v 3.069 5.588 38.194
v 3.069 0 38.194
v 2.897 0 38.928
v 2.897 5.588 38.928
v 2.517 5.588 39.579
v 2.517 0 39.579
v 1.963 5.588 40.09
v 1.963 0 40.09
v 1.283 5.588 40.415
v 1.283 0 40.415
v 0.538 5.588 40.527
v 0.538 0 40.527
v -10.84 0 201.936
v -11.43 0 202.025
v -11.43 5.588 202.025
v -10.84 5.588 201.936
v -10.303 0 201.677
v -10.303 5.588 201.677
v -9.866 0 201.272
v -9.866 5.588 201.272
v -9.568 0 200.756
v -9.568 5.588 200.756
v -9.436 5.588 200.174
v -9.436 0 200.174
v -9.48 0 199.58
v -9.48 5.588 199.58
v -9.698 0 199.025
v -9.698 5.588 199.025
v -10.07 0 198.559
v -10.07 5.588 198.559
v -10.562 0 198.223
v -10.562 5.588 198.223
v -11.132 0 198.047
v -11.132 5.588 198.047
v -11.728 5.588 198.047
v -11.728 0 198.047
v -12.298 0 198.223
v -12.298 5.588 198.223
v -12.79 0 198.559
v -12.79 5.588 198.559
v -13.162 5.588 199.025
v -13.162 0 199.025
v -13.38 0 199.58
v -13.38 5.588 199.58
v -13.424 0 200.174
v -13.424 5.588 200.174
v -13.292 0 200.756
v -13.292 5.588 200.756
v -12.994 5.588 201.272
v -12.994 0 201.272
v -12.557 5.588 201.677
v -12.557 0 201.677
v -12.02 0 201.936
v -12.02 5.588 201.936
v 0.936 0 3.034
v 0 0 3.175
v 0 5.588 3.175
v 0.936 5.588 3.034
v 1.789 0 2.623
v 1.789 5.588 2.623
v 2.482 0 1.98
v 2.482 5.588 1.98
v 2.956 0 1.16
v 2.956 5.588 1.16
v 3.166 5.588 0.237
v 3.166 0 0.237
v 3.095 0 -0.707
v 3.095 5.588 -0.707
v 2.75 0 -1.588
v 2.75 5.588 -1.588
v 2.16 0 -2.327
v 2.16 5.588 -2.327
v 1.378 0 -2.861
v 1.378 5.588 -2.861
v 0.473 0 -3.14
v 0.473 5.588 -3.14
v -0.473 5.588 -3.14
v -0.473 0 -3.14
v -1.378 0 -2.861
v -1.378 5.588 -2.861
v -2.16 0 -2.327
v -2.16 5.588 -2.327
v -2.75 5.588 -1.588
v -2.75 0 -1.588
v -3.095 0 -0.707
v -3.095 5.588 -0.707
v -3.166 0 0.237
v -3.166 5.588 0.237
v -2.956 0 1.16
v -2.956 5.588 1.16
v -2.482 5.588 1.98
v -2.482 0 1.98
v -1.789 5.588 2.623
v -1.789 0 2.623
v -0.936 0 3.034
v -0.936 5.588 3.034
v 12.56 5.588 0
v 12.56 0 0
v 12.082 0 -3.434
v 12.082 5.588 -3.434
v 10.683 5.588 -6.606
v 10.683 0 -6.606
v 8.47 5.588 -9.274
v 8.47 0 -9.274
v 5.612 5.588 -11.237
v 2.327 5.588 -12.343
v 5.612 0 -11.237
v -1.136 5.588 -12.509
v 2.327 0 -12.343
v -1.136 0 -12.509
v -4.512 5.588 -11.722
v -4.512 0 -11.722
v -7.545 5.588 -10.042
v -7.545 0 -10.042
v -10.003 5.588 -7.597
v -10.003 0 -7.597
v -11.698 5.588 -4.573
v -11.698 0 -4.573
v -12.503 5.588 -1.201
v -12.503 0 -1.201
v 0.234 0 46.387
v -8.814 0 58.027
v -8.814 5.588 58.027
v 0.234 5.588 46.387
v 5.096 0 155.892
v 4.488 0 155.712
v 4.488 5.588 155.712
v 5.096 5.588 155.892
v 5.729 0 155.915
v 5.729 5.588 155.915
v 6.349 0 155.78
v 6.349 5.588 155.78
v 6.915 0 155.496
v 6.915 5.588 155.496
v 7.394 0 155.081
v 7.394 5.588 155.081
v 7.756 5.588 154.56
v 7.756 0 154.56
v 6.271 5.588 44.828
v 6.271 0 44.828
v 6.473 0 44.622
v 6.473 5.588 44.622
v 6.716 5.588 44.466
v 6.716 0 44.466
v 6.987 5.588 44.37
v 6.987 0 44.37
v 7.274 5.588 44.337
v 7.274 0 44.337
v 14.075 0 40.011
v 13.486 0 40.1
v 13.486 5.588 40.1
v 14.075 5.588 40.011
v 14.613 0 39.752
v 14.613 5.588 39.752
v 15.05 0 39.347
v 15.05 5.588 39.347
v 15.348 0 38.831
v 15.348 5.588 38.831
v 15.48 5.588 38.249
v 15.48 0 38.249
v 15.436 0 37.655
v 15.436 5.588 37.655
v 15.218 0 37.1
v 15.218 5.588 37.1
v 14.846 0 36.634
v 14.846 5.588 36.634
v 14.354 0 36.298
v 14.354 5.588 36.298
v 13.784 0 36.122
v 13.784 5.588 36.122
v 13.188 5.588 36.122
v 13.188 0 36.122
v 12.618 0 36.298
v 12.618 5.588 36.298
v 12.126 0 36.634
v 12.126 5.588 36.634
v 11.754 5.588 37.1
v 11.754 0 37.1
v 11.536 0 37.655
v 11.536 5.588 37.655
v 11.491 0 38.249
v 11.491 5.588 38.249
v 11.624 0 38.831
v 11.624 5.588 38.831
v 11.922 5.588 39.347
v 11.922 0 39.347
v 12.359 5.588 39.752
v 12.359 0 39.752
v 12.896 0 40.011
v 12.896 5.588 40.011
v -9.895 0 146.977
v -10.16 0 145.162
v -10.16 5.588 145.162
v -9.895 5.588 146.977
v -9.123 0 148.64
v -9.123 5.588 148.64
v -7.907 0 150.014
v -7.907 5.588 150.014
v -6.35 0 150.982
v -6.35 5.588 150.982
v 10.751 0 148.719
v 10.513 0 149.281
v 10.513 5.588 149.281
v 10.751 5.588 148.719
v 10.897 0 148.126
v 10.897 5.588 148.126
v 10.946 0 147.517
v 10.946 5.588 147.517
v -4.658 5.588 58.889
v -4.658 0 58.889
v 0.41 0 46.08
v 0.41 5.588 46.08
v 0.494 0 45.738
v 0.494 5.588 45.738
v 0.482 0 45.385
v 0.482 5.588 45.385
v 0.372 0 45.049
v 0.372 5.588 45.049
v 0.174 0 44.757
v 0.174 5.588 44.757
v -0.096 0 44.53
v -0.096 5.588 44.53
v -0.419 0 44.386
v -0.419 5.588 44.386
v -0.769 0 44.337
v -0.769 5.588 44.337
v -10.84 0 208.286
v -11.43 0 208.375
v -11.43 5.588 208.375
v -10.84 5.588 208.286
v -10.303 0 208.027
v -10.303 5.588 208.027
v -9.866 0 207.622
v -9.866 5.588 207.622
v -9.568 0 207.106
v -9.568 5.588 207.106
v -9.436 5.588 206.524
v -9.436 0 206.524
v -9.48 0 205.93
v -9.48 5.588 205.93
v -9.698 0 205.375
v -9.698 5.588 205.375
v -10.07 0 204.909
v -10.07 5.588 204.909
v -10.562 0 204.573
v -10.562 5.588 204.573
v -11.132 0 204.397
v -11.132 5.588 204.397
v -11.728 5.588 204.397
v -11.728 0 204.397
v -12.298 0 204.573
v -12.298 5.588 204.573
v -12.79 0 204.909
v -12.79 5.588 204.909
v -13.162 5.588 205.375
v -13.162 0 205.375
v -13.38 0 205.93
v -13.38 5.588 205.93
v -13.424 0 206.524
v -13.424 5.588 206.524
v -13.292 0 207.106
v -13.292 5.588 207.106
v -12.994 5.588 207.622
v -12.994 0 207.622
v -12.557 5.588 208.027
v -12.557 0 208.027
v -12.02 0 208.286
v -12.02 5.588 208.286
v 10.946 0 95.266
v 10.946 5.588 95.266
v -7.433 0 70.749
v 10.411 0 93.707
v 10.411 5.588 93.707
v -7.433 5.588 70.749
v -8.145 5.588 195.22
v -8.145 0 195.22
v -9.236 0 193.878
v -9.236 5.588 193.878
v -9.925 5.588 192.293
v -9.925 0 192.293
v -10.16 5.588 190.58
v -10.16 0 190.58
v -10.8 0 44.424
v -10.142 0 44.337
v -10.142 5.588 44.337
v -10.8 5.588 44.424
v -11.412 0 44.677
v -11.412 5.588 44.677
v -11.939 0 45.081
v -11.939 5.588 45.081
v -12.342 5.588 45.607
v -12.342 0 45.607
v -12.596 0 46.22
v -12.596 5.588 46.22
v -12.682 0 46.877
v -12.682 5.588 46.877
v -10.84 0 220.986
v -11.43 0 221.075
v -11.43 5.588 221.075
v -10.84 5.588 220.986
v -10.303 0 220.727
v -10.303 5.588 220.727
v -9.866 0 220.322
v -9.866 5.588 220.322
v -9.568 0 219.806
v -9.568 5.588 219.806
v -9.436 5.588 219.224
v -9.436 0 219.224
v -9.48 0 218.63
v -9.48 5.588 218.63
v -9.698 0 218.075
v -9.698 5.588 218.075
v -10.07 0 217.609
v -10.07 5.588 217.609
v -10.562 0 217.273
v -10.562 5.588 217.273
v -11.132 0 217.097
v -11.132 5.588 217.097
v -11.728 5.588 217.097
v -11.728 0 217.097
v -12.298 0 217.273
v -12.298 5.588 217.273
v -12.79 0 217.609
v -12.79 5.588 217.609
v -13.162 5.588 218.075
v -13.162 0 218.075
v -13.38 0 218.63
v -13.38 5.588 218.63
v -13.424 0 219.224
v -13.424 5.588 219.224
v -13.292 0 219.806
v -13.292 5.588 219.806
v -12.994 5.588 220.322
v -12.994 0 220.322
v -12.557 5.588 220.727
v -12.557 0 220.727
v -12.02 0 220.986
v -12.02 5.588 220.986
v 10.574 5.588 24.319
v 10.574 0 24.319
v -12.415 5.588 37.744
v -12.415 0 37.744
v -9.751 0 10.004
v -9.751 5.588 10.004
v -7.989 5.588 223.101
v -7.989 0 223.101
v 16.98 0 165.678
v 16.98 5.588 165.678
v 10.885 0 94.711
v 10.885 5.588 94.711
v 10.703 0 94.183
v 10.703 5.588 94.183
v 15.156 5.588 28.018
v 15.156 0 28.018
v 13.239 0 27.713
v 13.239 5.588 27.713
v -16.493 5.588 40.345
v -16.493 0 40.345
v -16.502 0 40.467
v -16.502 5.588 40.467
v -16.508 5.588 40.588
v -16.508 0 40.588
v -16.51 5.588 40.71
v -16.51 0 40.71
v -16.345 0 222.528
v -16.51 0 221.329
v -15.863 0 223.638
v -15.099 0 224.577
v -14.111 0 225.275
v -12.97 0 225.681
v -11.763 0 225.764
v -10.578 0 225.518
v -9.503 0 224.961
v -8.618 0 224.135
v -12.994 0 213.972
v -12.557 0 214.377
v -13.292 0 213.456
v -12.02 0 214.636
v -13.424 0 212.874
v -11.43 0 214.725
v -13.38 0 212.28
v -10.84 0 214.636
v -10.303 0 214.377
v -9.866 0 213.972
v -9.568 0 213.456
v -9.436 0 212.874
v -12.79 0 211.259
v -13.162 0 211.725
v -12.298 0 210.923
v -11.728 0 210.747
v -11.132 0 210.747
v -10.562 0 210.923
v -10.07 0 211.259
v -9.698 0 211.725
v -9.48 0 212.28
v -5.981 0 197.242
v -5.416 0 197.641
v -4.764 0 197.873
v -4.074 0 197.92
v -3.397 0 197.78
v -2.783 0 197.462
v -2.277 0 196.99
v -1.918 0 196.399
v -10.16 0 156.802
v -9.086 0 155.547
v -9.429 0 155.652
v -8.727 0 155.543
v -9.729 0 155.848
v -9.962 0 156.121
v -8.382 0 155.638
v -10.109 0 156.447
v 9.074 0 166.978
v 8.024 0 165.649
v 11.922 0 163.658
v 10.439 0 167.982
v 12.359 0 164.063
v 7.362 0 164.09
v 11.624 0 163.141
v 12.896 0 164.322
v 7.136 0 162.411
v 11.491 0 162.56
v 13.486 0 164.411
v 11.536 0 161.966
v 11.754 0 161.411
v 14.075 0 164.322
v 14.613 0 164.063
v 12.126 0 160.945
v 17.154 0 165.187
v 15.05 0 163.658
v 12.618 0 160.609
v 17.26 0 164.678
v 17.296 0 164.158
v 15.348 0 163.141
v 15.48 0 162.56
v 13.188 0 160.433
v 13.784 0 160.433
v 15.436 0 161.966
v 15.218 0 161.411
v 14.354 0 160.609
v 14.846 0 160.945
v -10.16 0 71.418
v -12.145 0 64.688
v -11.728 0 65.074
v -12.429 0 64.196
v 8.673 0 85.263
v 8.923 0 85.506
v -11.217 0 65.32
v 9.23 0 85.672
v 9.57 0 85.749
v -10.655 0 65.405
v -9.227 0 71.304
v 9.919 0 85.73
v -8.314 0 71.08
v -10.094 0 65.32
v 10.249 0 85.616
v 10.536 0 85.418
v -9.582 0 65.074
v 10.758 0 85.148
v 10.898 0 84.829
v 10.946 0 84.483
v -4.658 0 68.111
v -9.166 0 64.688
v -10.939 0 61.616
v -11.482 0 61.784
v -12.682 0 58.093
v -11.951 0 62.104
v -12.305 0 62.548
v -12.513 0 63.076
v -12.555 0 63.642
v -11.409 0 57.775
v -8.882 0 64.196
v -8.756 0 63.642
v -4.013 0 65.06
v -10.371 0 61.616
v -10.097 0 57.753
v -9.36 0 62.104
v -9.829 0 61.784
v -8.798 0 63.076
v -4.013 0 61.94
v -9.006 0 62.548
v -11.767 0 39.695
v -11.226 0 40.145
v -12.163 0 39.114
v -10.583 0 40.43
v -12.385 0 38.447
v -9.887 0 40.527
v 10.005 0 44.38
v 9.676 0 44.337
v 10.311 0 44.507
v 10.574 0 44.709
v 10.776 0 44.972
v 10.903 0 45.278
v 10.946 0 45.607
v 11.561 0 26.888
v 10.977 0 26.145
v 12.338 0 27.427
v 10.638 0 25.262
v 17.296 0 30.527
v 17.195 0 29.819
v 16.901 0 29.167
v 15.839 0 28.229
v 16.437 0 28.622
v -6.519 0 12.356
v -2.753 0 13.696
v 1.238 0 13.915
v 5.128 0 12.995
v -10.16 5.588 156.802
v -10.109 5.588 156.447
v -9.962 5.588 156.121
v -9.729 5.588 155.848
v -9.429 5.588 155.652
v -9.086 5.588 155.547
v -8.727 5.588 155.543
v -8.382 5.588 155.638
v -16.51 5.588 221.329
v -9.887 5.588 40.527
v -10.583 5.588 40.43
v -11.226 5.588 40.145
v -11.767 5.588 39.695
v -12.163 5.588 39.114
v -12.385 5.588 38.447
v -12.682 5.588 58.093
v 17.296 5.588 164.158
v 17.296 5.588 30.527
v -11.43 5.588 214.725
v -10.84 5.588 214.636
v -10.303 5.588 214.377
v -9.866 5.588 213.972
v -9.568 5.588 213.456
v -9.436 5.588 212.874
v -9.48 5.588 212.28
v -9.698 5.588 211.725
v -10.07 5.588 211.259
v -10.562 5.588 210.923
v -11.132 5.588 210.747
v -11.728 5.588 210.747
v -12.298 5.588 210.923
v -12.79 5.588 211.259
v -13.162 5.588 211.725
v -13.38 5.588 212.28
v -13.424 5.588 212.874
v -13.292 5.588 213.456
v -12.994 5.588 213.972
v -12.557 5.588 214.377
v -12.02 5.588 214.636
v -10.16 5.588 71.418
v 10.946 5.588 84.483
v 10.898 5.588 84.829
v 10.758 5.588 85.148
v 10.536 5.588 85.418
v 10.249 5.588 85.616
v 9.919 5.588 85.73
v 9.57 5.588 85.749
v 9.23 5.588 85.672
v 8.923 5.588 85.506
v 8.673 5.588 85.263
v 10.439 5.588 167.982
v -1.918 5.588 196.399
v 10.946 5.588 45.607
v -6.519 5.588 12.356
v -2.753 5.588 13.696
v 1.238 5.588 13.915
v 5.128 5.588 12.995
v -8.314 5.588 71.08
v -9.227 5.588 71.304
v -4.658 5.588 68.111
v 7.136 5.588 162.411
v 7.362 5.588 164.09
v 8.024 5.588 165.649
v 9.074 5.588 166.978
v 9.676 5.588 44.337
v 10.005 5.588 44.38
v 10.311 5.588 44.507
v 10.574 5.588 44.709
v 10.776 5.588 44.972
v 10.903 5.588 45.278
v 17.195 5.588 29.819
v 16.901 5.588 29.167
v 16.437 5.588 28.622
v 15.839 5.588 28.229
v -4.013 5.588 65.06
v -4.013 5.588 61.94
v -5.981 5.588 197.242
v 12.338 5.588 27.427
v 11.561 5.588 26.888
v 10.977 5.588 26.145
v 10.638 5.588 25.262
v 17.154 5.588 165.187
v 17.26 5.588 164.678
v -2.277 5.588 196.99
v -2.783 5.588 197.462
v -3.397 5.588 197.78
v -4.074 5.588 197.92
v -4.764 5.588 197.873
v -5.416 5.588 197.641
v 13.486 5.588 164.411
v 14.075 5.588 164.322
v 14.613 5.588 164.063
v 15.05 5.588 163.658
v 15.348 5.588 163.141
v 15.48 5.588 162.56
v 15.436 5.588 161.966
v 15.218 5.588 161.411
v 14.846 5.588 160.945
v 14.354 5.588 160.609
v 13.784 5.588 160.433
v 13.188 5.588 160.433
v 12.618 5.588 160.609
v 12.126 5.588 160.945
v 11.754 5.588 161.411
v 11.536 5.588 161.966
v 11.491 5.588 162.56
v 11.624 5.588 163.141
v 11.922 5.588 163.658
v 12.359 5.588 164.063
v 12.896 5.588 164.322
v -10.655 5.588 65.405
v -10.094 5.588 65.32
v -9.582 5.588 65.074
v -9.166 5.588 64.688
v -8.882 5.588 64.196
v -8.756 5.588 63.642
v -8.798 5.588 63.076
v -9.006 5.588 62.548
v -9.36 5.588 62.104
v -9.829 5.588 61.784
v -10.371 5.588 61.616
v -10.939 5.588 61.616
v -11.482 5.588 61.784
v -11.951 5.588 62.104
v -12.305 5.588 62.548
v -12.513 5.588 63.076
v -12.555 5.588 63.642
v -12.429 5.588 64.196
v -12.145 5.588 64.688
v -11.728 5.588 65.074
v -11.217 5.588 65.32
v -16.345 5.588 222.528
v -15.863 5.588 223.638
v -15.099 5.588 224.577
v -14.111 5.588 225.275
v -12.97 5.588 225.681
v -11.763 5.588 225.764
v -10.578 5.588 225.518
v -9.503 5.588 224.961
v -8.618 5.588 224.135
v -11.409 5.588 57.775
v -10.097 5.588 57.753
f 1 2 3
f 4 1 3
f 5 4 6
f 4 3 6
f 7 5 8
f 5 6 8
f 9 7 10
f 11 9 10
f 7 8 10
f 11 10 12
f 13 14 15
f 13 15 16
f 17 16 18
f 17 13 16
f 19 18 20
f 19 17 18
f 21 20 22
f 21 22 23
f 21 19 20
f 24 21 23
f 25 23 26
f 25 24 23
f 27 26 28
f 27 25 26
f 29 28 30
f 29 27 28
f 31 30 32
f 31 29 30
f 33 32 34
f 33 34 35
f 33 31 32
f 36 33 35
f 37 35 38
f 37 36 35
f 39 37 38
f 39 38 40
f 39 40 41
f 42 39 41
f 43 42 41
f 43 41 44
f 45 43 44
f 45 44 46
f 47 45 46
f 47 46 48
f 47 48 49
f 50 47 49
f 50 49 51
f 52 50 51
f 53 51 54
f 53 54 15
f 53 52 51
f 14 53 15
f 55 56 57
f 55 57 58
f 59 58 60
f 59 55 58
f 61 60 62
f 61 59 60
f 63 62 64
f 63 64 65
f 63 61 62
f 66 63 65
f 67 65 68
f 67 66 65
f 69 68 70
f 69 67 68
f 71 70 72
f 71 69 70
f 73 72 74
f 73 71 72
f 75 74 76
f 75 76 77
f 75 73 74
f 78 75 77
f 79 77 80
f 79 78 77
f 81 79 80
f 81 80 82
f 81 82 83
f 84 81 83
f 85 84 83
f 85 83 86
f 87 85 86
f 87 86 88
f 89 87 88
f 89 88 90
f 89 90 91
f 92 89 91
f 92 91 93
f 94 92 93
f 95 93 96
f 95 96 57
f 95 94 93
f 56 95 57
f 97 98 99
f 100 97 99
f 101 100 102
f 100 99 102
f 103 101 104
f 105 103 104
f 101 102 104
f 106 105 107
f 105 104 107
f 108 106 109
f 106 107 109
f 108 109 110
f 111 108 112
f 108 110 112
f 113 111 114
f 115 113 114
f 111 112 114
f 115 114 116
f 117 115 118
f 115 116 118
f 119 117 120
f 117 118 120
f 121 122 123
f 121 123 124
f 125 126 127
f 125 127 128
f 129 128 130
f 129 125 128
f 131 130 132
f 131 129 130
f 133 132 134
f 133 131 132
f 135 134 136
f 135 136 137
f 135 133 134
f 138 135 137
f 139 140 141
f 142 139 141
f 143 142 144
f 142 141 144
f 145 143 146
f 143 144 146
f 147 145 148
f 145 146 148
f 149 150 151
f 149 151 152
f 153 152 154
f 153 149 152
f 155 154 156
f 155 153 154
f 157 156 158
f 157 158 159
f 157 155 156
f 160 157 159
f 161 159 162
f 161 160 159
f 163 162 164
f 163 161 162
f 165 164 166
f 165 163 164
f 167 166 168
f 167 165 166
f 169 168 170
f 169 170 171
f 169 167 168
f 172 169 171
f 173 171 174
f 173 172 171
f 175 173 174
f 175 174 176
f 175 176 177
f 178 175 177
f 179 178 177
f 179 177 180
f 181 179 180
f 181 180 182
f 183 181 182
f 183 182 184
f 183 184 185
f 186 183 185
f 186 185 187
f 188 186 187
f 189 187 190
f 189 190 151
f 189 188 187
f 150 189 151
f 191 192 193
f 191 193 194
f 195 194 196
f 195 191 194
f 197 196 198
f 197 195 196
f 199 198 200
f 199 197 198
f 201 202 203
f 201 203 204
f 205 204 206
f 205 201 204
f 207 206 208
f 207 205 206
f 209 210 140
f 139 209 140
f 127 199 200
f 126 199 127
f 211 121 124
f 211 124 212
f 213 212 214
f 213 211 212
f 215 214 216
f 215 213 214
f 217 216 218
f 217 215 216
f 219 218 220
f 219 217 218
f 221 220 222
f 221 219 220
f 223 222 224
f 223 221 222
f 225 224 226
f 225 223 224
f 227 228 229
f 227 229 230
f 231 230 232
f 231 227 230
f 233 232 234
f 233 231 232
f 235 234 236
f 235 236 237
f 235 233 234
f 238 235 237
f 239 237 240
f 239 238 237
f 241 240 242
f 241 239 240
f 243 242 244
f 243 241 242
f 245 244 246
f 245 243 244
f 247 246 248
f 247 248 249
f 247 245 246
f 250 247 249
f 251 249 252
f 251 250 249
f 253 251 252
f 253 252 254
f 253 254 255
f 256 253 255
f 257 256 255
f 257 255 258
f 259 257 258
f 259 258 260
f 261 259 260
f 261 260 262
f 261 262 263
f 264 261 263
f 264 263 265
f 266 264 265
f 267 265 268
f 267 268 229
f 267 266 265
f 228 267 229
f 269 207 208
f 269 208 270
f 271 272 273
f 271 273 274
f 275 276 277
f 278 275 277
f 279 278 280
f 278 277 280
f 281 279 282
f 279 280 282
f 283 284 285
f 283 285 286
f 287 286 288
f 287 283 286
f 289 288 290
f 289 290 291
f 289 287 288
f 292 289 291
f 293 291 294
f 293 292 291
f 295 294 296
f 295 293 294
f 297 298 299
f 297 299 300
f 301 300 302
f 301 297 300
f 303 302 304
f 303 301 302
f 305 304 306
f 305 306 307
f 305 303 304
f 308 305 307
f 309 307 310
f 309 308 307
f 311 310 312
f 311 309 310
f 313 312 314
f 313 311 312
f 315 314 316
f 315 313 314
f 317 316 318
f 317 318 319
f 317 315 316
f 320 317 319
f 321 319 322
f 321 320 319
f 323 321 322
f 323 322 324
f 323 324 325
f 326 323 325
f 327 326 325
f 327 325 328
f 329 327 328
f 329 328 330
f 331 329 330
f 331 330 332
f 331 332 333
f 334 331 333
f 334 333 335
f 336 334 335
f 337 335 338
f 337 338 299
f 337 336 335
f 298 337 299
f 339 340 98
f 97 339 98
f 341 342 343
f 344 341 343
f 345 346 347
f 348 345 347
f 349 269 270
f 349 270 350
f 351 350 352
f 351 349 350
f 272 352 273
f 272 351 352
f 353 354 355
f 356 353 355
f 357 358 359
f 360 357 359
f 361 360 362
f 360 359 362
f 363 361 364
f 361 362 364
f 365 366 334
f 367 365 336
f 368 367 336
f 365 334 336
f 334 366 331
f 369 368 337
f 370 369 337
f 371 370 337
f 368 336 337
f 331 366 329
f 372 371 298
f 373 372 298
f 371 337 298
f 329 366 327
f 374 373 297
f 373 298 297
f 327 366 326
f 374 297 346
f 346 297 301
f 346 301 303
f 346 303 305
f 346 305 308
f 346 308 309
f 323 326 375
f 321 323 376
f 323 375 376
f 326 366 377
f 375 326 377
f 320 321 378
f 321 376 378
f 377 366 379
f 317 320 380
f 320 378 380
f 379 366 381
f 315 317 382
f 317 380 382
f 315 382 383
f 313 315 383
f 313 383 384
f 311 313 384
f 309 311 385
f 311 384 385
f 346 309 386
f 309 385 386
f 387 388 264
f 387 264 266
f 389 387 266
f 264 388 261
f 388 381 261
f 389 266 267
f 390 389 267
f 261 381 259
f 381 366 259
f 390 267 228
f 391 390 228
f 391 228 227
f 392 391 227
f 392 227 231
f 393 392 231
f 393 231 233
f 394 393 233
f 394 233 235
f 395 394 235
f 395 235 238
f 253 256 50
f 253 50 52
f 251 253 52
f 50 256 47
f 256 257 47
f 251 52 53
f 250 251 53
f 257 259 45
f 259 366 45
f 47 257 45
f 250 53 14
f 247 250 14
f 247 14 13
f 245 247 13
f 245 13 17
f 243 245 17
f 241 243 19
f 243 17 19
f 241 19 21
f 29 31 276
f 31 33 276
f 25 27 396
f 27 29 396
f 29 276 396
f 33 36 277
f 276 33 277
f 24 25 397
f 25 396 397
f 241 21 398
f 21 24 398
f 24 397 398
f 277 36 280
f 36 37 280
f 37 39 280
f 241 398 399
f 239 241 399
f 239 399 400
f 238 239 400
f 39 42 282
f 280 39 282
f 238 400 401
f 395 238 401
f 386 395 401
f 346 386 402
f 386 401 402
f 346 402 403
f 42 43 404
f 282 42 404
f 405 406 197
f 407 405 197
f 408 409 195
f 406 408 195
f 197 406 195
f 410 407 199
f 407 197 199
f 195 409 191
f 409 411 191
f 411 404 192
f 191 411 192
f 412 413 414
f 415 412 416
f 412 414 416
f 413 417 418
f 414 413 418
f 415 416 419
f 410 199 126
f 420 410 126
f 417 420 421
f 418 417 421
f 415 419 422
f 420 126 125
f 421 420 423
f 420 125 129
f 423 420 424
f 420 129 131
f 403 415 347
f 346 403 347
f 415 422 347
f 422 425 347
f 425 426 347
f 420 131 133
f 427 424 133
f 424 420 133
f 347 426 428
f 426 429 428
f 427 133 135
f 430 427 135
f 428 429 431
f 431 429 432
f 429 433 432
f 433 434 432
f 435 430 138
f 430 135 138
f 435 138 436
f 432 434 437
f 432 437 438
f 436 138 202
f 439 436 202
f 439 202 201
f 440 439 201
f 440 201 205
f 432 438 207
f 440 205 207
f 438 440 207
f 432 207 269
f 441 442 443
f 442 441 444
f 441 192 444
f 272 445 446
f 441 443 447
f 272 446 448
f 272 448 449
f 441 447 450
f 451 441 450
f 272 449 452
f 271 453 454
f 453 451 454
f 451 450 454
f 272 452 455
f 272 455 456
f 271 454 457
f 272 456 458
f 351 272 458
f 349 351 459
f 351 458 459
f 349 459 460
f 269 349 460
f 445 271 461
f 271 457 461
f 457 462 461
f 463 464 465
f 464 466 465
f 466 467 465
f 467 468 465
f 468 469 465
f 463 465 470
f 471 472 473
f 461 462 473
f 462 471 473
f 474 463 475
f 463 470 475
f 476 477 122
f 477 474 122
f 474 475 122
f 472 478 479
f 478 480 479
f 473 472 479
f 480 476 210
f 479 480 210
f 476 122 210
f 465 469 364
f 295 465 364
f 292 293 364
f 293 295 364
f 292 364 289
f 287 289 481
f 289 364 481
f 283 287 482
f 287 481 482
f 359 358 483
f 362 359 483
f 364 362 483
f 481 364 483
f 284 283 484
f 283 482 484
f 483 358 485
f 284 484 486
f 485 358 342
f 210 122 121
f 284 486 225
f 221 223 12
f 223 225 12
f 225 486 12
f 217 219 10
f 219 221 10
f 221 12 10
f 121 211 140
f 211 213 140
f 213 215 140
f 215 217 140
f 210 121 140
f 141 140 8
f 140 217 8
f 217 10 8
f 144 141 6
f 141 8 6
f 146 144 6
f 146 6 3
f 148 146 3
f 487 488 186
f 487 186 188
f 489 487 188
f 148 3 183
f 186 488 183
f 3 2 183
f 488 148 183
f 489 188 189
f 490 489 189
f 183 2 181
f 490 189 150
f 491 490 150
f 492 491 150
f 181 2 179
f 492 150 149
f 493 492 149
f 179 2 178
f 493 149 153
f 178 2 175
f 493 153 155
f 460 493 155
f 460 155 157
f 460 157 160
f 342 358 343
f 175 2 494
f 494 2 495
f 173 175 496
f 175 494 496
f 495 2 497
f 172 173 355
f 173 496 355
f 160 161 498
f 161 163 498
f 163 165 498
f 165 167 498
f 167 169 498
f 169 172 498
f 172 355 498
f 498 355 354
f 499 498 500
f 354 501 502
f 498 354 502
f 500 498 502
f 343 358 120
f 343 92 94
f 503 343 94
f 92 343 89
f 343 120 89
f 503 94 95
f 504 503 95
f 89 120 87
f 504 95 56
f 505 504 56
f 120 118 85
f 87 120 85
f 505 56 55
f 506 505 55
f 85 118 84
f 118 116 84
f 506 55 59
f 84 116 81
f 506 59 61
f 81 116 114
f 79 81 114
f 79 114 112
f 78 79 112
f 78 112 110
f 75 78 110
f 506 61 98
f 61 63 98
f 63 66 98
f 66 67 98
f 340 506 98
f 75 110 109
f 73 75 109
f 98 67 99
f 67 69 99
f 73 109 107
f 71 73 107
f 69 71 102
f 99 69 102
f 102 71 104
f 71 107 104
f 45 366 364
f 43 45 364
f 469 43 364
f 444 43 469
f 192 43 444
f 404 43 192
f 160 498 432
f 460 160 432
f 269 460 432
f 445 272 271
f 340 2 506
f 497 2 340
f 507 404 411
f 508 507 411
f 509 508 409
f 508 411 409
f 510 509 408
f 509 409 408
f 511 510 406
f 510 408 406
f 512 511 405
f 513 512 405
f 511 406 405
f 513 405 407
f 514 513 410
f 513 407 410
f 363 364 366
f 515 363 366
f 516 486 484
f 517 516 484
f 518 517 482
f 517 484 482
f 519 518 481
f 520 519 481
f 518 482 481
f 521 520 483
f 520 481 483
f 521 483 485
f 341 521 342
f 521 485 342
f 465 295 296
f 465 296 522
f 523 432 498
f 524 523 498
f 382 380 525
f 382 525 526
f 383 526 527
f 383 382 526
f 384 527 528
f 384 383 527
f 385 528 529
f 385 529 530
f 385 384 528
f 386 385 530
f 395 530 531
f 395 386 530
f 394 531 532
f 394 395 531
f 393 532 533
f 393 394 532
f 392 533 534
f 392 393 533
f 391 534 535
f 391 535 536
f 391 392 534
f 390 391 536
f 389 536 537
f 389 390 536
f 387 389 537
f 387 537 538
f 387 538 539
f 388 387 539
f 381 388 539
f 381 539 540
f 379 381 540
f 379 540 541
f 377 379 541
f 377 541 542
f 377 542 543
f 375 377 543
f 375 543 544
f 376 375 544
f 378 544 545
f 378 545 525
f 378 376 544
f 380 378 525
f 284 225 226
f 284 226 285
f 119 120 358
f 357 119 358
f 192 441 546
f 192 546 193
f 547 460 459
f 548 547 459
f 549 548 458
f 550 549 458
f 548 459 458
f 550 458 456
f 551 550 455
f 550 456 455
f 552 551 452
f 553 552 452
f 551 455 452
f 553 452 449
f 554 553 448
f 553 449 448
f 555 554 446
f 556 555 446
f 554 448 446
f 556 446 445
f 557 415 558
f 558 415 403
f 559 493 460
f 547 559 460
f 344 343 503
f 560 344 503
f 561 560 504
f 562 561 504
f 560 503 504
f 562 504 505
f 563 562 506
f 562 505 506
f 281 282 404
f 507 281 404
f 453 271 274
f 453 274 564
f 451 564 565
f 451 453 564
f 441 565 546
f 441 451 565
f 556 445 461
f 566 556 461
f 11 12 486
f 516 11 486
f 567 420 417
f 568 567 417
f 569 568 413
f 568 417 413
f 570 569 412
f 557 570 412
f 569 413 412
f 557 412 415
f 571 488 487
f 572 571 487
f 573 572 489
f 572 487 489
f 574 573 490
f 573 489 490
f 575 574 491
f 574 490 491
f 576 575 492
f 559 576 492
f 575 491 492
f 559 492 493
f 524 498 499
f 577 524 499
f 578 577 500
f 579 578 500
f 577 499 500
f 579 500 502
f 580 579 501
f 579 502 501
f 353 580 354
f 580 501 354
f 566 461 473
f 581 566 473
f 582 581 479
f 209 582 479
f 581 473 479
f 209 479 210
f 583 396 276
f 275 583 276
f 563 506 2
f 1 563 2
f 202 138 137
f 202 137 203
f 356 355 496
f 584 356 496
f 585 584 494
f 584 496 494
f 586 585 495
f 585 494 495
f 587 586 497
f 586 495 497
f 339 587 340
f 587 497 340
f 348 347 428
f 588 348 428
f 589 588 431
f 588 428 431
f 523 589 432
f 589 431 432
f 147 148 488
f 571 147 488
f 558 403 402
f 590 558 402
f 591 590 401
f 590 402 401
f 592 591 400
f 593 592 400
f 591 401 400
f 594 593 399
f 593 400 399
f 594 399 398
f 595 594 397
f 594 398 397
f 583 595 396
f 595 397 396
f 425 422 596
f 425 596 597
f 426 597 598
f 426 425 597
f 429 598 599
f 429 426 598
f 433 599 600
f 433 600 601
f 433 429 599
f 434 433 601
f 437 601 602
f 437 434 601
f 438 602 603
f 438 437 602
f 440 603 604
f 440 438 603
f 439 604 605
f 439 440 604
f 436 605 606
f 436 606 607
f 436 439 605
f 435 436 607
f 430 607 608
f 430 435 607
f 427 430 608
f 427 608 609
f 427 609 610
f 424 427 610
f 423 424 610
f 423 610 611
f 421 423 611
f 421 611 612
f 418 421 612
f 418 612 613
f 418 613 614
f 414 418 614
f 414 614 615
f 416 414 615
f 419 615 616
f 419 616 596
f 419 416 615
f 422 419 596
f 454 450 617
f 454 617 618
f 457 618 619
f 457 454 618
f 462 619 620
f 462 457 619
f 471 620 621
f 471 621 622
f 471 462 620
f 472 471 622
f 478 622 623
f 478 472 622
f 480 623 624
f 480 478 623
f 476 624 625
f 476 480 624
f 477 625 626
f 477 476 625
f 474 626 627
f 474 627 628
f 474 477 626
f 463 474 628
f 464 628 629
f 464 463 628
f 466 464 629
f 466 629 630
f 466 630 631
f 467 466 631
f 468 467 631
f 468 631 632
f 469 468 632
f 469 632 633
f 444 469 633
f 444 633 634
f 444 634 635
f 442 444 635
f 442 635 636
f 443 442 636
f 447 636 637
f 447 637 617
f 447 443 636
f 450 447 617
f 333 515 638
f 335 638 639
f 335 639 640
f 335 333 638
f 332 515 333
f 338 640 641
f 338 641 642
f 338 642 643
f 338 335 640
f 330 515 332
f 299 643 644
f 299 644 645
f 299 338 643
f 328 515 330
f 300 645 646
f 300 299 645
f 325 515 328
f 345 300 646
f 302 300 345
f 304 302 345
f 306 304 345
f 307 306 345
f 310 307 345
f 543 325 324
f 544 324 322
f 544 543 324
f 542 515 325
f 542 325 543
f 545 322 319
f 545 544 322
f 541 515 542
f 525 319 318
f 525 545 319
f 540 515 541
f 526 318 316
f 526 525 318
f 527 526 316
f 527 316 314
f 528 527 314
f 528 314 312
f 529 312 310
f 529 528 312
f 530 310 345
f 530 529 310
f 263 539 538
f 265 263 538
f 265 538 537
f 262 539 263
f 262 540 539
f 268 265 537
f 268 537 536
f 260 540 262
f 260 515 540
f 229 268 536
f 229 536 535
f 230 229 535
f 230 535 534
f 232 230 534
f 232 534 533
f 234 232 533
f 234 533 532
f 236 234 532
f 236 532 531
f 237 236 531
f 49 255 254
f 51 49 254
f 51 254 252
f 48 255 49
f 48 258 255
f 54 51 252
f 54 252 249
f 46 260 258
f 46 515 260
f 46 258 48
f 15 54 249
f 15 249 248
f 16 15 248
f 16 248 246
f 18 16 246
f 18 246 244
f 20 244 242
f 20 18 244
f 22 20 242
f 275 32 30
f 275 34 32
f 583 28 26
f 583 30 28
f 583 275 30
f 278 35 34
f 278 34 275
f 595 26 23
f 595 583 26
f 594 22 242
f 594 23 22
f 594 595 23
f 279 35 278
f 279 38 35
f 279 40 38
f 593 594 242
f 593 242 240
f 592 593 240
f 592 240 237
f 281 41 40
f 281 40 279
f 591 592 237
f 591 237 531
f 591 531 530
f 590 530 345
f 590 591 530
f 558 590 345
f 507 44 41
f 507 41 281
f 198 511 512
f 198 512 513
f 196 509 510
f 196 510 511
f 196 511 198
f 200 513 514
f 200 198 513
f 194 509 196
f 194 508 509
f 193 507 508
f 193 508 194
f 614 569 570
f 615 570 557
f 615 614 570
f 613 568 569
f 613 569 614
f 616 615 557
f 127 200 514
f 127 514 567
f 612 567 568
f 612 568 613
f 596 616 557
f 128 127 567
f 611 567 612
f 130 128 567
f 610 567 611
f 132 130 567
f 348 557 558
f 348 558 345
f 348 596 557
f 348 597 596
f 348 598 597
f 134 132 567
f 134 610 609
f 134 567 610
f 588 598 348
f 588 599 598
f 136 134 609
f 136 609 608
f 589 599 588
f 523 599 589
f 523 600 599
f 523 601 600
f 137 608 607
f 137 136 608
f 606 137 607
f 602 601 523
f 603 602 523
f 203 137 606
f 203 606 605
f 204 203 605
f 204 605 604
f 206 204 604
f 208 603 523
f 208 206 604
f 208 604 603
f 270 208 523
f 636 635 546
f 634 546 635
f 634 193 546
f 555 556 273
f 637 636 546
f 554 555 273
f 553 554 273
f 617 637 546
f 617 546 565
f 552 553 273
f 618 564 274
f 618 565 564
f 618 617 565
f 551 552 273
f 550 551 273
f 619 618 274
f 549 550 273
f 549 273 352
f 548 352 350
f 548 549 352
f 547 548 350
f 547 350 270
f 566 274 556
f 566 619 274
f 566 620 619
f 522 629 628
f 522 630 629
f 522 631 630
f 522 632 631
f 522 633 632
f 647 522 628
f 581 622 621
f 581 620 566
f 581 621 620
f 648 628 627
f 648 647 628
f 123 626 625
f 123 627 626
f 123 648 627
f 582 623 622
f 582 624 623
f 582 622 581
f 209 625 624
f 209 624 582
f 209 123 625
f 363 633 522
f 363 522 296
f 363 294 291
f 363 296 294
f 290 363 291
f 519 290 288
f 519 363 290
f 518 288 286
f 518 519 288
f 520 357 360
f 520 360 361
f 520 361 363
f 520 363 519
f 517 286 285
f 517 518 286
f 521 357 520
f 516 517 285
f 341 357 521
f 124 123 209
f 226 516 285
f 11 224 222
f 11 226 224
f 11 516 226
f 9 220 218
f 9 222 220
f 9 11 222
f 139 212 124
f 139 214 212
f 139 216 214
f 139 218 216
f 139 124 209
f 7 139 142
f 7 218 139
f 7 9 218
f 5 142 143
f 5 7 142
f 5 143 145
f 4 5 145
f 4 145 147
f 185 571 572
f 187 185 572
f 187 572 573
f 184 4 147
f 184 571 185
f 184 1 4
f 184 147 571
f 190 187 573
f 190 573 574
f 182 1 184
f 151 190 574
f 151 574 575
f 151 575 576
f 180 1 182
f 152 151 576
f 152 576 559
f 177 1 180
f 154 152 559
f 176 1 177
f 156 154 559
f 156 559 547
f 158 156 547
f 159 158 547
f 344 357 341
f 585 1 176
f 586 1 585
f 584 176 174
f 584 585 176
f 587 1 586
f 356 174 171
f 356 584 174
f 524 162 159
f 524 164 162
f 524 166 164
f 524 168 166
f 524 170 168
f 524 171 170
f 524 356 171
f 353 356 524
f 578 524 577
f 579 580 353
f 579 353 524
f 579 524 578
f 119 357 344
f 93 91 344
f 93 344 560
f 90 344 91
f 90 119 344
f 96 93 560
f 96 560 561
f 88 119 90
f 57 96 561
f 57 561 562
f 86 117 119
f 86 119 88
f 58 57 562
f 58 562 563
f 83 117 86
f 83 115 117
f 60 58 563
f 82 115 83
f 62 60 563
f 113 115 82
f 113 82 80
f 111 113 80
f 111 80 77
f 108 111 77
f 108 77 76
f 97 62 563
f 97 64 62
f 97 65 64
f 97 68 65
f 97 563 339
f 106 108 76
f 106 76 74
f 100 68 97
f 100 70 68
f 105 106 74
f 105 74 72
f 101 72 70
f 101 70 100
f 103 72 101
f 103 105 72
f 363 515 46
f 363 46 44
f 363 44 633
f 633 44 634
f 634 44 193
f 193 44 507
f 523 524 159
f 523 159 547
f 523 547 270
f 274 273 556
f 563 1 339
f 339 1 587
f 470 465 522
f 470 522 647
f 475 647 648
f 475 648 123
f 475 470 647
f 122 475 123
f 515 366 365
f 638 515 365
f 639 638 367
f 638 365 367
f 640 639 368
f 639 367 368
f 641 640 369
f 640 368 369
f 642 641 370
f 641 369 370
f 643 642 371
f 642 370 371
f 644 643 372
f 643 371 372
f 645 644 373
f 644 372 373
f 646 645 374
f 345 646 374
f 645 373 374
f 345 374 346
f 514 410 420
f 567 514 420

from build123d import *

# Parameters (mm, degrees)
SKETCH2_R           = 3.175
SKETCH2_R_2         = 2
SKETCH2_R_3         = 1.905
SKETCH2_R_4         = 1.999999991
BOSS_EXTRUDE1_DEPTH = 5.588


with BuildPart() as part:
    # Sketch2 → Boss-Extrude1 (new body)
    with BuildSketch(Plane(origin=(0, 0, 0), x_dir=(1, 0, 0), z_dir=(0, 1, 0))):
        with BuildLine():
            Line((15.15555913, -28.018449791), (13.238676936, -27.713033224))
            ThreePointArc((13.238676936, -27.713033224), (11.241051513, -26.538356195), (10.573787778, -24.319092227))
            Line((10.573787778, -24.319092227), (12.5603, 0))
            ThreePointArc((12.5603, 0), (0.601023521, 12.545911956), (-12.502780789, 1.200670076))
            Line((-12.502780789, 1.200670076), (-16.492552312, -40.345496304))
            ThreePointArc((-16.492552312, -40.345496304), (-16.505635578, -40.527391114), (-16.51, -40.709703607))
            Line((-16.51, -40.709703607), (-16.51, -221.328861788))
            ThreePointArc((-16.51, -221.328861788), (-12.970187584, -225.680718913), (-7.988667969, -223.101301399))
            Line((-7.988667969, -223.101301399), (16.979901226, -165.677523619))
            ThreePointArc((16.979901226, -165.677523619), (17.216065593, -164.934164738), (17.295902343, -164.158289667))
            Line((17.295902343, -164.158289667), (17.295902343, -30.526810701))
            ThreePointArc((17.295902343, -30.526810701), (16.688093876, -28.878103365), (15.15555913, -28.018449791))
        make_face()
        with Locations(Location((0, 0, 0), (0, 0, 270))):
            Circle(SKETCH2_R, mode=Mode.SUBTRACT)
        with Locations(Location((-11.43, -219.075, 0), (0, 0, 270))):
            Circle(SKETCH2_R_2, mode=Mode.SUBTRACT)
        with Locations(Location((-11.43, -212.725, 0), (0, 0, 270))):
            Circle(SKETCH2_R_2, mode=Mode.SUBTRACT)
        with Locations(Location((-11.43, -206.375, 0), (0, 0, 270))):
            Circle(SKETCH2_R_2, mode=Mode.SUBTRACT)
        with Locations(Location((-11.43, -200.025, 0), (0, 0, 270))):
            Circle(SKETCH2_R_2, mode=Mode.SUBTRACT)
        with Locations(Location((-10.6553, -63.5, 0), (0, 0, 270))):
            Circle(SKETCH2_R_3, mode=Mode.SUBTRACT)
        with Locations(Location((13.485902343, -38.1, 0), (0, 0, 270))):
            Circle(SKETCH2_R_4, mode=Mode.SUBTRACT)
        with Locations(Location((13.485902343, -162.410770806, 0), (0, 0, 270))):
            Circle(SKETCH2_R_2, mode=Mode.SUBTRACT)
        with BuildLine():
            Line((10.438542905, -167.981776143), (-1.917547411, -196.39883837))
            ThreePointArc((-1.917547411, -196.39883837), (-3.730878547, -197.873050616), (-5.981020282, -197.241913761))
            Line((-5.981020282, -197.241913761), (-8.145350704, -195.219576049))
            ThreePointArc((-8.145350704, -195.219576049), (-9.634602002, -193.108963545), (-10.16, -190.579830983))
            Line((-10.16, -190.579830983), (-10.16, -156.802168612))
            ThreePointArc((-10.16, -156.802168612), (-9.585607464, -155.739610257), (-8.381999597, -155.638194561))
            Line((-8.381999597, -155.638194561), (7.135902343, -162.410768606))
            ThreePointArc((7.135902343, -162.410768606), (8.0236114, -165.648961297), (10.438542905, -167.981776143))
        make_face(mode=Mode.SUBTRACT)
        with BuildLine():
            Line((10.945902343, -147.517141807), (10.945902343, -95.265809134))
            ThreePointArc((10.945902343, -95.265809134), (10.80854708, -94.441856302), (10.411336777, -93.70701706))
            Line((10.411336777, -93.70701706), (-7.433233368, -70.749423162))
            ThreePointArc((-7.433233368, -70.749423162), (-8.766818111, -71.205159681), (-10.16, -71.417734996))
            Line((-10.16, -71.417734996), (-10.16, -145.162426346))
            ThreePointArc((-10.16, -145.162426346), (-9.122791771, -148.640463666), (-6.350002016, -150.982296599))
            Line((-6.350002016, -150.982296599), (4.488151635, -155.712459117))
            ThreePointArc((4.488151635, -155.712459117), (6.348753278, -155.779975361), (7.755557144, -154.560426346))
            Line((7.755557144, -154.560426346), (10.513009397, -149.281014802))
            ThreePointArc((10.513009397, -149.281014802), (10.836096789, -148.425250314), (10.945902343, -147.517141807))
        make_face(mode=Mode.SUBTRACT)
        with BuildLine():
            Line((-4.65837794, -58.888907788), (6.271106887, -44.827785995))
            ThreePointArc((6.271106887, -44.827785995), (6.715672228, -44.466407521), (7.273824104, -44.337182032))
            Line((7.273824104, -44.337182032), (9.675902343, -44.337182032))
            ThreePointArc((9.675902343, -44.337182032), (10.573927955, -44.70915642), (10.945902343, -45.607182032))
            Line((10.945902343, -45.607182032), (10.945902343, -84.483166252))
            ThreePointArc((10.945902343, -84.483166252), (10.087878759, -85.684488621), (8.673185126, -85.26256229))
            Line((8.673185126, -85.26256229), (-4.65837794, -68.111092212))
            ThreePointArc((-4.65837794, -68.111092212), (-3.931340897, -63.5), (-4.65837794, -58.888907788))
        make_face(mode=Mode.SUBTRACT)
        with BuildLine():
            Line((-12.415233052, -37.744377163), (-9.751235062, -10.003715048))
            ThreePointArc((-9.751235062, -10.003715048), (-2.753398549, -13.695973731), (5.127655889, -12.99492382))
            Line((5.127655889, -12.99492382), (3.069264048, -38.19397392))
            ThreePointArc((3.069264048, -38.19397392), (2.259083254, -39.854914801), (0.537695935, -40.527182032))
            Line((0.537695935, -40.527182032), (-9.886864844, -40.527182032))
            ThreePointArc((-9.886864844, -40.527182032), (-11.766801594, -39.695232914), (-12.415233052, -37.744377163))
        make_face(mode=Mode.SUBTRACT)
        with BuildLine():
            Line((-0.768822282, -44.337182032), (-10.142472044, -44.337182032))
            ThreePointArc((-10.142472044, -44.337182032), (-11.938523268, -45.081130808), (-12.682472044, -46.877182032))
            Line((-12.682472044, -46.877182032), (-12.682472044, -58.093297101))
            ThreePointArc((-12.682472044, -58.093297101), (-10.75401097, -57.726602484), (-8.814141549, -58.027158116))
            Line((-8.814141549, -58.027158116), (0.233894935, -46.386578069))
            ThreePointArc((0.233894935, -46.386578069), (0.371952228, -45.049030156), (-0.768822282, -44.337182032))
        make_face(mode=Mode.SUBTRACT)
    extrude(amount=BOSS_EXTRUDE1_DEPTH)


solid = part.part
